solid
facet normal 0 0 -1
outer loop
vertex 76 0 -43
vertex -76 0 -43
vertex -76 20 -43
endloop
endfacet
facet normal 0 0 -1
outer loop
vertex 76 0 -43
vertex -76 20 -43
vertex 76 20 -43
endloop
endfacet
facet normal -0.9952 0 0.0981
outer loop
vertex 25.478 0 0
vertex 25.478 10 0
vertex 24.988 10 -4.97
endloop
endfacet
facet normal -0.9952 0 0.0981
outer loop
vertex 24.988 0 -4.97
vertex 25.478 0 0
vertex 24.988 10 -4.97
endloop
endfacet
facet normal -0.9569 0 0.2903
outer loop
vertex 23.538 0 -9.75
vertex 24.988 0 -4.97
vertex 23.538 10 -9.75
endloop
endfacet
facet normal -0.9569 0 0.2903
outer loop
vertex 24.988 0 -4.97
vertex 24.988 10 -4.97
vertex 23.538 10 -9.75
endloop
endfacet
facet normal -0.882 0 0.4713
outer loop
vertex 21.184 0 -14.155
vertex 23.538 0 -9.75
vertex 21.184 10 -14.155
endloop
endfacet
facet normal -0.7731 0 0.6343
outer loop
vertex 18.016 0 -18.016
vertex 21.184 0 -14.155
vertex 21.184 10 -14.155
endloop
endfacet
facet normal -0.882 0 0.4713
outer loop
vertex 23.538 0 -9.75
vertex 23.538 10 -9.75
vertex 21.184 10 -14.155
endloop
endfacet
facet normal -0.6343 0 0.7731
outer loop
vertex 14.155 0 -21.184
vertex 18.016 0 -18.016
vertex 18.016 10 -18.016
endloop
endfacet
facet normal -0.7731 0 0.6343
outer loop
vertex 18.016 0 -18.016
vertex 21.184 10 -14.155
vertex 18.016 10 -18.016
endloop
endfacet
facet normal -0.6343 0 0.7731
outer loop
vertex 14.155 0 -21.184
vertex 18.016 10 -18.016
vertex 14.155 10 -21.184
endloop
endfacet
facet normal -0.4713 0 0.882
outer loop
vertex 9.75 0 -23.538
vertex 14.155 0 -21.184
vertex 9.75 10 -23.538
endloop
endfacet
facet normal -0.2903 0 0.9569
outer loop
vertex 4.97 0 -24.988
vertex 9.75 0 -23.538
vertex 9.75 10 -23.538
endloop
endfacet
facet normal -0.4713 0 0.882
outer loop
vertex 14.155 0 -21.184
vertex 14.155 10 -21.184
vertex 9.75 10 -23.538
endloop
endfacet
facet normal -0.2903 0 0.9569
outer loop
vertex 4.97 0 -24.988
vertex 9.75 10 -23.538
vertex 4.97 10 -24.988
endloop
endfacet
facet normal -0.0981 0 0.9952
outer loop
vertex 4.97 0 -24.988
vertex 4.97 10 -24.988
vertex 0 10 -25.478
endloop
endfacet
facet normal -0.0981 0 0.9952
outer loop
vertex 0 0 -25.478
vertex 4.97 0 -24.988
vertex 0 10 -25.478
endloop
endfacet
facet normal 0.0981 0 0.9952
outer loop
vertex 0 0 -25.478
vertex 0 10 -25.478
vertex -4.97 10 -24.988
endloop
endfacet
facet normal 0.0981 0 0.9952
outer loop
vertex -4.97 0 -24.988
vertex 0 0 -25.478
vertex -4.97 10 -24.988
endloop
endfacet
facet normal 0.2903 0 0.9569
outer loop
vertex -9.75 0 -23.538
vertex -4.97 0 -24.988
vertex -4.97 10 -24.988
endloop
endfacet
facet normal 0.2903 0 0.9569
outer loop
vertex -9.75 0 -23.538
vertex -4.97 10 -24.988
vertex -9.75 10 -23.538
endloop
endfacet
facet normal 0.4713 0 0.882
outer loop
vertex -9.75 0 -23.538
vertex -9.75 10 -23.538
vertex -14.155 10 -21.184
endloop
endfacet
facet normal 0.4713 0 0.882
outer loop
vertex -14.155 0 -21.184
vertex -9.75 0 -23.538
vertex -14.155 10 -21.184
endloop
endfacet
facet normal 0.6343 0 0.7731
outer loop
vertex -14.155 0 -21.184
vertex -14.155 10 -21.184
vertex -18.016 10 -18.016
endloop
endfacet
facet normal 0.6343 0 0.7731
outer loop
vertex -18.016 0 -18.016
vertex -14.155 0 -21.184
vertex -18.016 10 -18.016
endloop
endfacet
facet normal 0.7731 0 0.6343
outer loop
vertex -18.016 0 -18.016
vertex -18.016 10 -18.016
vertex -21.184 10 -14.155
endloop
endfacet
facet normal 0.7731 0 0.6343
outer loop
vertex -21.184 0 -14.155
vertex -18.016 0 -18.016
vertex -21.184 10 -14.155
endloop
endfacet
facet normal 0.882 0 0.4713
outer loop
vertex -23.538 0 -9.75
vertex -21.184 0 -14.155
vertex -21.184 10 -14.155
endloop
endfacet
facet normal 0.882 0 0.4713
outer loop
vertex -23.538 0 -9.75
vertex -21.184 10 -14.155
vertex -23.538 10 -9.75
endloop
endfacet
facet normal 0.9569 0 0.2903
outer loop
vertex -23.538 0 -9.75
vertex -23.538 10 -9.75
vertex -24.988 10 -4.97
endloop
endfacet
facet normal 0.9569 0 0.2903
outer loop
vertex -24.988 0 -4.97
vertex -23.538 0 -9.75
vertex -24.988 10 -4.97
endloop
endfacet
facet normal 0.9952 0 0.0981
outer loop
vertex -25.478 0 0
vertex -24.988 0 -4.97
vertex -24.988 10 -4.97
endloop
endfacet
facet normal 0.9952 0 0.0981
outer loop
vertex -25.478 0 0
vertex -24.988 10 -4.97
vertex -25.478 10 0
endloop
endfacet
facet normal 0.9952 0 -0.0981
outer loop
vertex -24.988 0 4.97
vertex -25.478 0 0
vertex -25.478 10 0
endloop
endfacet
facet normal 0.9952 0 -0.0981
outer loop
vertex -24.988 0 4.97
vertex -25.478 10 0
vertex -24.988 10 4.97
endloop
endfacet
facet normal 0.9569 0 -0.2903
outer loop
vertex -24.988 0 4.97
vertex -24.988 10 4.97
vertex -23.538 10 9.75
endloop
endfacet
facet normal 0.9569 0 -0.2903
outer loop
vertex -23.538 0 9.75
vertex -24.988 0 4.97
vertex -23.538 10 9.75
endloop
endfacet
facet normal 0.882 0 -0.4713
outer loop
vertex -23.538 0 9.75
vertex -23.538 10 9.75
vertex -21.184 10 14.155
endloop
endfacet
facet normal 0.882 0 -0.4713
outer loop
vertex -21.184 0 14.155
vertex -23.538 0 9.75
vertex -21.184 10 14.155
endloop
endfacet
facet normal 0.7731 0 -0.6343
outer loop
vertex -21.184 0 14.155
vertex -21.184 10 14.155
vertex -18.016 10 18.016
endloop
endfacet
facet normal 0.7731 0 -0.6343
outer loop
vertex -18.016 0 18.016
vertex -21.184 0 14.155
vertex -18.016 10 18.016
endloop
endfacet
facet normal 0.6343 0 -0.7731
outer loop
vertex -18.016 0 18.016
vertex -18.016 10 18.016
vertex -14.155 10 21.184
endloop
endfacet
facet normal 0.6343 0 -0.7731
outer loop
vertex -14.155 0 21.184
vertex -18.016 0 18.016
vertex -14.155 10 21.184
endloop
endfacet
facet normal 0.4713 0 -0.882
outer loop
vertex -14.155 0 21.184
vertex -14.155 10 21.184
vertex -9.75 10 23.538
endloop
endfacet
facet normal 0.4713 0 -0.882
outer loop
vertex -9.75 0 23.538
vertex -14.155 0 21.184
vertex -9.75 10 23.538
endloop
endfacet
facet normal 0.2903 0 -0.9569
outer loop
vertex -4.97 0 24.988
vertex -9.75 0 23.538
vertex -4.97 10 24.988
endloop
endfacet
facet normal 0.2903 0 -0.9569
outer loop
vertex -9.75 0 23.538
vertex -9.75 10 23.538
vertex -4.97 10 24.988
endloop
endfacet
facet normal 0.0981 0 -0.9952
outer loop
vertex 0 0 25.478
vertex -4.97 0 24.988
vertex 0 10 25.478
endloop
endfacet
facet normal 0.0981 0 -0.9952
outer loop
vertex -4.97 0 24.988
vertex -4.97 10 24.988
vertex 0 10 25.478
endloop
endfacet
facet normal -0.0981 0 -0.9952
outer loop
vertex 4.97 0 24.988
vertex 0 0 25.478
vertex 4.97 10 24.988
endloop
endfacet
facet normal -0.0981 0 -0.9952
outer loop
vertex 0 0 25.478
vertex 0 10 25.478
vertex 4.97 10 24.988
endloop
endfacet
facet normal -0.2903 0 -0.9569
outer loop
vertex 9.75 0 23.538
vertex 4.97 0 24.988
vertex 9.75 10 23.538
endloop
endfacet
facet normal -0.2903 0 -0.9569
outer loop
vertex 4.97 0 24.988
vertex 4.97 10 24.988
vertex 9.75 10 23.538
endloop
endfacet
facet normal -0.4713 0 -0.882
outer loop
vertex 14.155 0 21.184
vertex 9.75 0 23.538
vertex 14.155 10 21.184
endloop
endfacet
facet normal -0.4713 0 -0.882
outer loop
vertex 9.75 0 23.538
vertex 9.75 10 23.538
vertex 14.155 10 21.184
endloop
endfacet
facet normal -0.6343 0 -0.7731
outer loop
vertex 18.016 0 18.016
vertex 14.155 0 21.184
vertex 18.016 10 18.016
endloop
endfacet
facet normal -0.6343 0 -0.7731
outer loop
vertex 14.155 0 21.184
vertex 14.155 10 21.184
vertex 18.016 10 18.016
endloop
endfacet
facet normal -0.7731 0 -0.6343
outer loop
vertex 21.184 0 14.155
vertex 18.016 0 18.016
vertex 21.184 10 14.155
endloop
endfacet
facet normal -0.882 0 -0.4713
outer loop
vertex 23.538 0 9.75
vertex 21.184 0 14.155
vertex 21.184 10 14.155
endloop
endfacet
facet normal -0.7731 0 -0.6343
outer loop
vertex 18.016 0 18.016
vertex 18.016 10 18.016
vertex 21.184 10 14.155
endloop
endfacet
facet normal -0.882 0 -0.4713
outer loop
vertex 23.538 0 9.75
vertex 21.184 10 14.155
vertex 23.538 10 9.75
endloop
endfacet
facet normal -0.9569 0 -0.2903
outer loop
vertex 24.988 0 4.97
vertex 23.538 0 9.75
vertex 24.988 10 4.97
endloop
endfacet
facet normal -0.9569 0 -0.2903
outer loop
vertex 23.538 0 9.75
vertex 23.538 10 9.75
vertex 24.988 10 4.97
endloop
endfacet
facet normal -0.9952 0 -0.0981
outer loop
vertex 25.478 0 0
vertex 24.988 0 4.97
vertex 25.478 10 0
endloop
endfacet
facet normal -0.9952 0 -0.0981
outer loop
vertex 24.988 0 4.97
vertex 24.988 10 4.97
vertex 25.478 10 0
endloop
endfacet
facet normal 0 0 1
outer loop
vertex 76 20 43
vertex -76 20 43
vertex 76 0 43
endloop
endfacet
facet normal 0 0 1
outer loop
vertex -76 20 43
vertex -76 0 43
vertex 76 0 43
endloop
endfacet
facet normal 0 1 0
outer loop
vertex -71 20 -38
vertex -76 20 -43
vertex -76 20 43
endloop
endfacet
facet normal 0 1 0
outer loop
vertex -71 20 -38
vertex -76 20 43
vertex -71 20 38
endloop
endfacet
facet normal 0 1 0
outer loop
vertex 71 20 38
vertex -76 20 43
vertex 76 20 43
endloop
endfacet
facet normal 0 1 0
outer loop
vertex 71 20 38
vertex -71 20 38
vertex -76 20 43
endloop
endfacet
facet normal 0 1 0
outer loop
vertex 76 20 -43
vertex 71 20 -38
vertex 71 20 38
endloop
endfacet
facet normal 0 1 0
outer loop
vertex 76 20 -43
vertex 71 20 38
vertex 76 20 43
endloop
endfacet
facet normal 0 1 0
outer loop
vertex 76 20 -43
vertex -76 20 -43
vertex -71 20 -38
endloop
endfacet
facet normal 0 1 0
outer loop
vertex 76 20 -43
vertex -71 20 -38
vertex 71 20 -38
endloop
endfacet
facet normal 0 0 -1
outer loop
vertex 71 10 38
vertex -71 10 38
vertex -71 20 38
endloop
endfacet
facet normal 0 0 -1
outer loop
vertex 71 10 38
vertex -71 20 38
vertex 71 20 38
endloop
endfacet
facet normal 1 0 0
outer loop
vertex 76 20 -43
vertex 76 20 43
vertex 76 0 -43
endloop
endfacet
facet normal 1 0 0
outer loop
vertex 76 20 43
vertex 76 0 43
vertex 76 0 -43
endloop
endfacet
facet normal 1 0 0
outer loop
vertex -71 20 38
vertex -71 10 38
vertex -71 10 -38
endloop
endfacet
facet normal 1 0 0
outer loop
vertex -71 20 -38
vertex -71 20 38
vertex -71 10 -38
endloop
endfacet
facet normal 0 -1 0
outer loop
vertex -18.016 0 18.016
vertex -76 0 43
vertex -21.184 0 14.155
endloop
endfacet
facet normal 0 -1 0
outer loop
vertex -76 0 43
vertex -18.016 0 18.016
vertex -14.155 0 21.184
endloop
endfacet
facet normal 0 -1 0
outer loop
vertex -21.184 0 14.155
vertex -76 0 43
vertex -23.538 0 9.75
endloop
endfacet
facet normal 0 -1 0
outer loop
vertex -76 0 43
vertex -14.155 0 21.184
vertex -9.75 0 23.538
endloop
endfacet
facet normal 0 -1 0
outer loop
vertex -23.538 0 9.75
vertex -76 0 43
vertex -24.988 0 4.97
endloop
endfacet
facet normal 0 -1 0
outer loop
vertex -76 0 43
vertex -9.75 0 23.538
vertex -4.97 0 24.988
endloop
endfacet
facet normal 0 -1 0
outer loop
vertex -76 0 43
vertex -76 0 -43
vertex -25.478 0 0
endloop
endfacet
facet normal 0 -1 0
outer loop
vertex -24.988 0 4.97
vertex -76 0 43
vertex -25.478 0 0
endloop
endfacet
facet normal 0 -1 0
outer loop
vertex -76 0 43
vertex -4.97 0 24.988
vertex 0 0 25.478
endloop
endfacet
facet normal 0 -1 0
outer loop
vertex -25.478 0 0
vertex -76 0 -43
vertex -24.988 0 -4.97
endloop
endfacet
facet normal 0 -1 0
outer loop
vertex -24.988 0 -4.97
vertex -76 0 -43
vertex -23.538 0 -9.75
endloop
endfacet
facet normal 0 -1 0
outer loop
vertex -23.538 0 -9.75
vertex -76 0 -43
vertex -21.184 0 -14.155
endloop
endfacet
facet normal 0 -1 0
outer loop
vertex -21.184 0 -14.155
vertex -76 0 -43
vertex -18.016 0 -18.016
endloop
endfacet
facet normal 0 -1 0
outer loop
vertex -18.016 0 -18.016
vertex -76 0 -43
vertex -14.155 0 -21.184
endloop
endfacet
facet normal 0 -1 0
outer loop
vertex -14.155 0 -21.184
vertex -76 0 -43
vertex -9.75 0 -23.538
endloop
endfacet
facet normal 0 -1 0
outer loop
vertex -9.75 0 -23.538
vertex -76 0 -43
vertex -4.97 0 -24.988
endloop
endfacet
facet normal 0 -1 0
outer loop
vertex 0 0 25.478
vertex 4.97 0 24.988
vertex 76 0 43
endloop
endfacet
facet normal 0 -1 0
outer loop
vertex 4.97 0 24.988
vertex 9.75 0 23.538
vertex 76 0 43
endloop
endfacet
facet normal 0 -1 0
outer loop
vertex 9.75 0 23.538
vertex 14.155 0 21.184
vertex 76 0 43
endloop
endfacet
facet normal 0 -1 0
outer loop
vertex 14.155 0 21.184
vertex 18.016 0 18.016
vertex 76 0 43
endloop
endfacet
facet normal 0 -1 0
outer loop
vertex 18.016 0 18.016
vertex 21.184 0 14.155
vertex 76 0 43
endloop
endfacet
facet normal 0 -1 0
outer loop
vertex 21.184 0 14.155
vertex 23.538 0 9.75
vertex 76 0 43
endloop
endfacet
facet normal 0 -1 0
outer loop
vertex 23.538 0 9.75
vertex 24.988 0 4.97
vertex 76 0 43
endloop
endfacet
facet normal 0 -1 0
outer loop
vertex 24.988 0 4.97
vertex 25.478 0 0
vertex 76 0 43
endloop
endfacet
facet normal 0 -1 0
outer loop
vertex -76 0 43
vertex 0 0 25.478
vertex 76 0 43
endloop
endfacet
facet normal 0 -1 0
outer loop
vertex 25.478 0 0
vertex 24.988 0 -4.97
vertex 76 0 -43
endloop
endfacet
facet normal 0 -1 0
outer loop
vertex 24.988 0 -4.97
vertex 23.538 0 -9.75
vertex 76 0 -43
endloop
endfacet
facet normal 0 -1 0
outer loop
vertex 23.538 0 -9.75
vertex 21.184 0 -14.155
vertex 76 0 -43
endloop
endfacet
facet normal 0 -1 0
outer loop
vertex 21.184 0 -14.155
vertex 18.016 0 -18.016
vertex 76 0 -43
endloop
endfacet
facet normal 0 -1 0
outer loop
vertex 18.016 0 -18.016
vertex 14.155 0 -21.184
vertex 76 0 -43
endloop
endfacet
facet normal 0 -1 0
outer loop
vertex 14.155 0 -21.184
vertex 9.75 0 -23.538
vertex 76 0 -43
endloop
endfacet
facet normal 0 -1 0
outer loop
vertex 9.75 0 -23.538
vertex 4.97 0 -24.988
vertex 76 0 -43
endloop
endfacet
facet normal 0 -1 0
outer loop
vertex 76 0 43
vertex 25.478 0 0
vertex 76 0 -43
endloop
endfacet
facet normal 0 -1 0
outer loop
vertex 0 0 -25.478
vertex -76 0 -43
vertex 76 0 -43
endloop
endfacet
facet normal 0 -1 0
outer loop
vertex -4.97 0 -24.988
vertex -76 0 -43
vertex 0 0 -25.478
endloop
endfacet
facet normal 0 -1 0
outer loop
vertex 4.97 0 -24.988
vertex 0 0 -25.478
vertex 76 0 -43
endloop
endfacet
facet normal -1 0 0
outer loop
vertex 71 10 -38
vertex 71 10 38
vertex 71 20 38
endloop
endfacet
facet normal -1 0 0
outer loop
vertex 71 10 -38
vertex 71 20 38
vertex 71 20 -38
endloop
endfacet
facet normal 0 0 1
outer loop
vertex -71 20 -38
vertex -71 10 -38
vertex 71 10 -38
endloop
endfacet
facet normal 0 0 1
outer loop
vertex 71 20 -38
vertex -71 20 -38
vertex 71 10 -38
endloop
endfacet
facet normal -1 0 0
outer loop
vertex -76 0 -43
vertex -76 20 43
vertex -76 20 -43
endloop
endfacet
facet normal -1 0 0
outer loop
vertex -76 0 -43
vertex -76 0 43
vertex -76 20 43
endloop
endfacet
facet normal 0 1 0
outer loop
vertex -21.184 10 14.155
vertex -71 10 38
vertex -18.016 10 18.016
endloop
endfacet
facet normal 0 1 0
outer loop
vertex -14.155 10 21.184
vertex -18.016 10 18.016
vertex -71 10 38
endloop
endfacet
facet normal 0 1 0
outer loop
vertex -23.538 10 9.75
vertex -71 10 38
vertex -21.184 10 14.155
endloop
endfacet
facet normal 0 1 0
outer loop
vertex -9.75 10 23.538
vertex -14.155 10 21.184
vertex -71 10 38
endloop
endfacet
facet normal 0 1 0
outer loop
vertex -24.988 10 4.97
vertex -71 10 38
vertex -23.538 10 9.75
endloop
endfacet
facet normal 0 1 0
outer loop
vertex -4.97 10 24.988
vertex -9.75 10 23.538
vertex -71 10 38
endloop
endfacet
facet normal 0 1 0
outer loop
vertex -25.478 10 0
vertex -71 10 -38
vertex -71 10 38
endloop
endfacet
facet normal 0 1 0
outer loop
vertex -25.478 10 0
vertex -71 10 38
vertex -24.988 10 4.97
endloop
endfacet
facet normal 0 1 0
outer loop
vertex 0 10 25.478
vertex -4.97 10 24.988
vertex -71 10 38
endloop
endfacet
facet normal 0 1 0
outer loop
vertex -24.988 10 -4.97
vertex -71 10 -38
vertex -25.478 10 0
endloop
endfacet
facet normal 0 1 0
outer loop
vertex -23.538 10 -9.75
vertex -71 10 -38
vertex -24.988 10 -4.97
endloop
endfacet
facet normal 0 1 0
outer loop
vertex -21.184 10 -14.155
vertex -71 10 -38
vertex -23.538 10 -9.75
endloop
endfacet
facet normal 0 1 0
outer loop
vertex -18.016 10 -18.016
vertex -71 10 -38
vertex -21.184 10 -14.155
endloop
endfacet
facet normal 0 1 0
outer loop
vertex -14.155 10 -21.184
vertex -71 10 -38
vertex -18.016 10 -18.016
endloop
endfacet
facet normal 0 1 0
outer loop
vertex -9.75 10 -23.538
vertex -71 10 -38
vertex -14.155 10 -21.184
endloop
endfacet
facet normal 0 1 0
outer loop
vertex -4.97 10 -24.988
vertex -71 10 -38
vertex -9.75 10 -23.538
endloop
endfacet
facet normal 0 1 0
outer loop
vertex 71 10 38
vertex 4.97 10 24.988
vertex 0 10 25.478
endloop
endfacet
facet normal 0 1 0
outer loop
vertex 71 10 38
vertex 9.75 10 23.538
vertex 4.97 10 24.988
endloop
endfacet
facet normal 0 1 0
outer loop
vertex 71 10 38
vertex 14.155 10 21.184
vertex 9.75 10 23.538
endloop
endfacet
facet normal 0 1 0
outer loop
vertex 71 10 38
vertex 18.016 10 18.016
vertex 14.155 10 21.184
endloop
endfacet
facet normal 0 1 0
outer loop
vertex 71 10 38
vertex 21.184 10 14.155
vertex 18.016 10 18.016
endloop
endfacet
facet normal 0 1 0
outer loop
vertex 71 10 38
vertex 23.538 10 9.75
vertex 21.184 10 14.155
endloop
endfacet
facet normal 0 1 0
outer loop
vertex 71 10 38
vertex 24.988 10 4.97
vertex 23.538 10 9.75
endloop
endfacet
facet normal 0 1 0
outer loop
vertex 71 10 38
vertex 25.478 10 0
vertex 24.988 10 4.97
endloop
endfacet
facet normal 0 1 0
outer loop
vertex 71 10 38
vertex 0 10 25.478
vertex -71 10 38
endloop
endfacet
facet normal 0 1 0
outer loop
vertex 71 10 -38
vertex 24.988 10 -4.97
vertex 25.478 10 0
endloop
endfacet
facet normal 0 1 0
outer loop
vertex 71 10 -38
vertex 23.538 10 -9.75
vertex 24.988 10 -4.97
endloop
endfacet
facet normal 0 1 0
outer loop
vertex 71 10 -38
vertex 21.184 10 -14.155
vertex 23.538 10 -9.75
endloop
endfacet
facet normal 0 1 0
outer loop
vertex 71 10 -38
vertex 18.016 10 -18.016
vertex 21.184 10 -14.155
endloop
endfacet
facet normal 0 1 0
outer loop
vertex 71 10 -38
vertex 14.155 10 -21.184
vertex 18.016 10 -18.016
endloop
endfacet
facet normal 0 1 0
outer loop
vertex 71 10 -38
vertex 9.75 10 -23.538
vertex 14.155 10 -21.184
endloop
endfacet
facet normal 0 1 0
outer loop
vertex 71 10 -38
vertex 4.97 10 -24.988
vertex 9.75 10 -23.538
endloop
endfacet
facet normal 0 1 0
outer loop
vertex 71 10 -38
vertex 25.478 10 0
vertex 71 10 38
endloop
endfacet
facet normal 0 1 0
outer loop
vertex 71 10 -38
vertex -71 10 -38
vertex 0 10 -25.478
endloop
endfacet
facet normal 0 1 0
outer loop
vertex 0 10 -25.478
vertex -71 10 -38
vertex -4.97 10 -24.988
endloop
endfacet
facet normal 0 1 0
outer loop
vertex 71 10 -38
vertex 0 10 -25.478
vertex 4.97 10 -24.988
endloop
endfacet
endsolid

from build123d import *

# Parameters (mm, degrees)
SKETCH1_W                          = 152
SKETCH1_H                          = 86
BOSS_EXTRUDE1_DEPTH                = 10
SKETCH2_W                          = 152
SKETCH2_H                          = 86
SKETCH2_W_2                        = 142
SKETCH2_H_2                        = 76
BOSS_EXTRUDE2_DEPTH                = 10
F_2_0350_40_UNS_TAPPED_HOLE1_D     = 50.955575
F_2_0350_40_UNS_TAPPED_HOLE1_DEPTH = 106.56


with BuildPart() as part:
    # Sketch1 → Boss-Extrude1 (new body)
    with BuildSketch(Plane(origin=(0, 0, 0), x_dir=(1, 0, 0), z_dir=(0, 1, 0))):
        Rectangle(SKETCH1_W, SKETCH1_H)
    extrude(amount=BOSS_EXTRUDE1_DEPTH)

    # Sketch2 → Boss-Extrude2 (add)
    with BuildSketch(Plane(origin=(0, 10, 0), x_dir=(1, 0, 0), z_dir=(0, 1, 0))):
        Rectangle(SKETCH2_W, SKETCH2_H)
        Rectangle(SKETCH2_W_2, SKETCH2_H_2, mode=Mode.SUBTRACT)
    extrude(amount=BOSS_EXTRUDE2_DEPTH)

    # 2.0350-40 UNS Tapped Hole1
    with Locations(Plane(origin=(0, 0, 0), x_dir=(-1, 0, 0), z_dir=(0, -1, 0))):
        with Locations((0, 0)):
            Hole(F_2_0350_40_UNS_TAPPED_HOLE1_D / 2, depth=F_2_0350_40_UNS_TAPPED_HOLE1_DEPTH)


solid = part.part
